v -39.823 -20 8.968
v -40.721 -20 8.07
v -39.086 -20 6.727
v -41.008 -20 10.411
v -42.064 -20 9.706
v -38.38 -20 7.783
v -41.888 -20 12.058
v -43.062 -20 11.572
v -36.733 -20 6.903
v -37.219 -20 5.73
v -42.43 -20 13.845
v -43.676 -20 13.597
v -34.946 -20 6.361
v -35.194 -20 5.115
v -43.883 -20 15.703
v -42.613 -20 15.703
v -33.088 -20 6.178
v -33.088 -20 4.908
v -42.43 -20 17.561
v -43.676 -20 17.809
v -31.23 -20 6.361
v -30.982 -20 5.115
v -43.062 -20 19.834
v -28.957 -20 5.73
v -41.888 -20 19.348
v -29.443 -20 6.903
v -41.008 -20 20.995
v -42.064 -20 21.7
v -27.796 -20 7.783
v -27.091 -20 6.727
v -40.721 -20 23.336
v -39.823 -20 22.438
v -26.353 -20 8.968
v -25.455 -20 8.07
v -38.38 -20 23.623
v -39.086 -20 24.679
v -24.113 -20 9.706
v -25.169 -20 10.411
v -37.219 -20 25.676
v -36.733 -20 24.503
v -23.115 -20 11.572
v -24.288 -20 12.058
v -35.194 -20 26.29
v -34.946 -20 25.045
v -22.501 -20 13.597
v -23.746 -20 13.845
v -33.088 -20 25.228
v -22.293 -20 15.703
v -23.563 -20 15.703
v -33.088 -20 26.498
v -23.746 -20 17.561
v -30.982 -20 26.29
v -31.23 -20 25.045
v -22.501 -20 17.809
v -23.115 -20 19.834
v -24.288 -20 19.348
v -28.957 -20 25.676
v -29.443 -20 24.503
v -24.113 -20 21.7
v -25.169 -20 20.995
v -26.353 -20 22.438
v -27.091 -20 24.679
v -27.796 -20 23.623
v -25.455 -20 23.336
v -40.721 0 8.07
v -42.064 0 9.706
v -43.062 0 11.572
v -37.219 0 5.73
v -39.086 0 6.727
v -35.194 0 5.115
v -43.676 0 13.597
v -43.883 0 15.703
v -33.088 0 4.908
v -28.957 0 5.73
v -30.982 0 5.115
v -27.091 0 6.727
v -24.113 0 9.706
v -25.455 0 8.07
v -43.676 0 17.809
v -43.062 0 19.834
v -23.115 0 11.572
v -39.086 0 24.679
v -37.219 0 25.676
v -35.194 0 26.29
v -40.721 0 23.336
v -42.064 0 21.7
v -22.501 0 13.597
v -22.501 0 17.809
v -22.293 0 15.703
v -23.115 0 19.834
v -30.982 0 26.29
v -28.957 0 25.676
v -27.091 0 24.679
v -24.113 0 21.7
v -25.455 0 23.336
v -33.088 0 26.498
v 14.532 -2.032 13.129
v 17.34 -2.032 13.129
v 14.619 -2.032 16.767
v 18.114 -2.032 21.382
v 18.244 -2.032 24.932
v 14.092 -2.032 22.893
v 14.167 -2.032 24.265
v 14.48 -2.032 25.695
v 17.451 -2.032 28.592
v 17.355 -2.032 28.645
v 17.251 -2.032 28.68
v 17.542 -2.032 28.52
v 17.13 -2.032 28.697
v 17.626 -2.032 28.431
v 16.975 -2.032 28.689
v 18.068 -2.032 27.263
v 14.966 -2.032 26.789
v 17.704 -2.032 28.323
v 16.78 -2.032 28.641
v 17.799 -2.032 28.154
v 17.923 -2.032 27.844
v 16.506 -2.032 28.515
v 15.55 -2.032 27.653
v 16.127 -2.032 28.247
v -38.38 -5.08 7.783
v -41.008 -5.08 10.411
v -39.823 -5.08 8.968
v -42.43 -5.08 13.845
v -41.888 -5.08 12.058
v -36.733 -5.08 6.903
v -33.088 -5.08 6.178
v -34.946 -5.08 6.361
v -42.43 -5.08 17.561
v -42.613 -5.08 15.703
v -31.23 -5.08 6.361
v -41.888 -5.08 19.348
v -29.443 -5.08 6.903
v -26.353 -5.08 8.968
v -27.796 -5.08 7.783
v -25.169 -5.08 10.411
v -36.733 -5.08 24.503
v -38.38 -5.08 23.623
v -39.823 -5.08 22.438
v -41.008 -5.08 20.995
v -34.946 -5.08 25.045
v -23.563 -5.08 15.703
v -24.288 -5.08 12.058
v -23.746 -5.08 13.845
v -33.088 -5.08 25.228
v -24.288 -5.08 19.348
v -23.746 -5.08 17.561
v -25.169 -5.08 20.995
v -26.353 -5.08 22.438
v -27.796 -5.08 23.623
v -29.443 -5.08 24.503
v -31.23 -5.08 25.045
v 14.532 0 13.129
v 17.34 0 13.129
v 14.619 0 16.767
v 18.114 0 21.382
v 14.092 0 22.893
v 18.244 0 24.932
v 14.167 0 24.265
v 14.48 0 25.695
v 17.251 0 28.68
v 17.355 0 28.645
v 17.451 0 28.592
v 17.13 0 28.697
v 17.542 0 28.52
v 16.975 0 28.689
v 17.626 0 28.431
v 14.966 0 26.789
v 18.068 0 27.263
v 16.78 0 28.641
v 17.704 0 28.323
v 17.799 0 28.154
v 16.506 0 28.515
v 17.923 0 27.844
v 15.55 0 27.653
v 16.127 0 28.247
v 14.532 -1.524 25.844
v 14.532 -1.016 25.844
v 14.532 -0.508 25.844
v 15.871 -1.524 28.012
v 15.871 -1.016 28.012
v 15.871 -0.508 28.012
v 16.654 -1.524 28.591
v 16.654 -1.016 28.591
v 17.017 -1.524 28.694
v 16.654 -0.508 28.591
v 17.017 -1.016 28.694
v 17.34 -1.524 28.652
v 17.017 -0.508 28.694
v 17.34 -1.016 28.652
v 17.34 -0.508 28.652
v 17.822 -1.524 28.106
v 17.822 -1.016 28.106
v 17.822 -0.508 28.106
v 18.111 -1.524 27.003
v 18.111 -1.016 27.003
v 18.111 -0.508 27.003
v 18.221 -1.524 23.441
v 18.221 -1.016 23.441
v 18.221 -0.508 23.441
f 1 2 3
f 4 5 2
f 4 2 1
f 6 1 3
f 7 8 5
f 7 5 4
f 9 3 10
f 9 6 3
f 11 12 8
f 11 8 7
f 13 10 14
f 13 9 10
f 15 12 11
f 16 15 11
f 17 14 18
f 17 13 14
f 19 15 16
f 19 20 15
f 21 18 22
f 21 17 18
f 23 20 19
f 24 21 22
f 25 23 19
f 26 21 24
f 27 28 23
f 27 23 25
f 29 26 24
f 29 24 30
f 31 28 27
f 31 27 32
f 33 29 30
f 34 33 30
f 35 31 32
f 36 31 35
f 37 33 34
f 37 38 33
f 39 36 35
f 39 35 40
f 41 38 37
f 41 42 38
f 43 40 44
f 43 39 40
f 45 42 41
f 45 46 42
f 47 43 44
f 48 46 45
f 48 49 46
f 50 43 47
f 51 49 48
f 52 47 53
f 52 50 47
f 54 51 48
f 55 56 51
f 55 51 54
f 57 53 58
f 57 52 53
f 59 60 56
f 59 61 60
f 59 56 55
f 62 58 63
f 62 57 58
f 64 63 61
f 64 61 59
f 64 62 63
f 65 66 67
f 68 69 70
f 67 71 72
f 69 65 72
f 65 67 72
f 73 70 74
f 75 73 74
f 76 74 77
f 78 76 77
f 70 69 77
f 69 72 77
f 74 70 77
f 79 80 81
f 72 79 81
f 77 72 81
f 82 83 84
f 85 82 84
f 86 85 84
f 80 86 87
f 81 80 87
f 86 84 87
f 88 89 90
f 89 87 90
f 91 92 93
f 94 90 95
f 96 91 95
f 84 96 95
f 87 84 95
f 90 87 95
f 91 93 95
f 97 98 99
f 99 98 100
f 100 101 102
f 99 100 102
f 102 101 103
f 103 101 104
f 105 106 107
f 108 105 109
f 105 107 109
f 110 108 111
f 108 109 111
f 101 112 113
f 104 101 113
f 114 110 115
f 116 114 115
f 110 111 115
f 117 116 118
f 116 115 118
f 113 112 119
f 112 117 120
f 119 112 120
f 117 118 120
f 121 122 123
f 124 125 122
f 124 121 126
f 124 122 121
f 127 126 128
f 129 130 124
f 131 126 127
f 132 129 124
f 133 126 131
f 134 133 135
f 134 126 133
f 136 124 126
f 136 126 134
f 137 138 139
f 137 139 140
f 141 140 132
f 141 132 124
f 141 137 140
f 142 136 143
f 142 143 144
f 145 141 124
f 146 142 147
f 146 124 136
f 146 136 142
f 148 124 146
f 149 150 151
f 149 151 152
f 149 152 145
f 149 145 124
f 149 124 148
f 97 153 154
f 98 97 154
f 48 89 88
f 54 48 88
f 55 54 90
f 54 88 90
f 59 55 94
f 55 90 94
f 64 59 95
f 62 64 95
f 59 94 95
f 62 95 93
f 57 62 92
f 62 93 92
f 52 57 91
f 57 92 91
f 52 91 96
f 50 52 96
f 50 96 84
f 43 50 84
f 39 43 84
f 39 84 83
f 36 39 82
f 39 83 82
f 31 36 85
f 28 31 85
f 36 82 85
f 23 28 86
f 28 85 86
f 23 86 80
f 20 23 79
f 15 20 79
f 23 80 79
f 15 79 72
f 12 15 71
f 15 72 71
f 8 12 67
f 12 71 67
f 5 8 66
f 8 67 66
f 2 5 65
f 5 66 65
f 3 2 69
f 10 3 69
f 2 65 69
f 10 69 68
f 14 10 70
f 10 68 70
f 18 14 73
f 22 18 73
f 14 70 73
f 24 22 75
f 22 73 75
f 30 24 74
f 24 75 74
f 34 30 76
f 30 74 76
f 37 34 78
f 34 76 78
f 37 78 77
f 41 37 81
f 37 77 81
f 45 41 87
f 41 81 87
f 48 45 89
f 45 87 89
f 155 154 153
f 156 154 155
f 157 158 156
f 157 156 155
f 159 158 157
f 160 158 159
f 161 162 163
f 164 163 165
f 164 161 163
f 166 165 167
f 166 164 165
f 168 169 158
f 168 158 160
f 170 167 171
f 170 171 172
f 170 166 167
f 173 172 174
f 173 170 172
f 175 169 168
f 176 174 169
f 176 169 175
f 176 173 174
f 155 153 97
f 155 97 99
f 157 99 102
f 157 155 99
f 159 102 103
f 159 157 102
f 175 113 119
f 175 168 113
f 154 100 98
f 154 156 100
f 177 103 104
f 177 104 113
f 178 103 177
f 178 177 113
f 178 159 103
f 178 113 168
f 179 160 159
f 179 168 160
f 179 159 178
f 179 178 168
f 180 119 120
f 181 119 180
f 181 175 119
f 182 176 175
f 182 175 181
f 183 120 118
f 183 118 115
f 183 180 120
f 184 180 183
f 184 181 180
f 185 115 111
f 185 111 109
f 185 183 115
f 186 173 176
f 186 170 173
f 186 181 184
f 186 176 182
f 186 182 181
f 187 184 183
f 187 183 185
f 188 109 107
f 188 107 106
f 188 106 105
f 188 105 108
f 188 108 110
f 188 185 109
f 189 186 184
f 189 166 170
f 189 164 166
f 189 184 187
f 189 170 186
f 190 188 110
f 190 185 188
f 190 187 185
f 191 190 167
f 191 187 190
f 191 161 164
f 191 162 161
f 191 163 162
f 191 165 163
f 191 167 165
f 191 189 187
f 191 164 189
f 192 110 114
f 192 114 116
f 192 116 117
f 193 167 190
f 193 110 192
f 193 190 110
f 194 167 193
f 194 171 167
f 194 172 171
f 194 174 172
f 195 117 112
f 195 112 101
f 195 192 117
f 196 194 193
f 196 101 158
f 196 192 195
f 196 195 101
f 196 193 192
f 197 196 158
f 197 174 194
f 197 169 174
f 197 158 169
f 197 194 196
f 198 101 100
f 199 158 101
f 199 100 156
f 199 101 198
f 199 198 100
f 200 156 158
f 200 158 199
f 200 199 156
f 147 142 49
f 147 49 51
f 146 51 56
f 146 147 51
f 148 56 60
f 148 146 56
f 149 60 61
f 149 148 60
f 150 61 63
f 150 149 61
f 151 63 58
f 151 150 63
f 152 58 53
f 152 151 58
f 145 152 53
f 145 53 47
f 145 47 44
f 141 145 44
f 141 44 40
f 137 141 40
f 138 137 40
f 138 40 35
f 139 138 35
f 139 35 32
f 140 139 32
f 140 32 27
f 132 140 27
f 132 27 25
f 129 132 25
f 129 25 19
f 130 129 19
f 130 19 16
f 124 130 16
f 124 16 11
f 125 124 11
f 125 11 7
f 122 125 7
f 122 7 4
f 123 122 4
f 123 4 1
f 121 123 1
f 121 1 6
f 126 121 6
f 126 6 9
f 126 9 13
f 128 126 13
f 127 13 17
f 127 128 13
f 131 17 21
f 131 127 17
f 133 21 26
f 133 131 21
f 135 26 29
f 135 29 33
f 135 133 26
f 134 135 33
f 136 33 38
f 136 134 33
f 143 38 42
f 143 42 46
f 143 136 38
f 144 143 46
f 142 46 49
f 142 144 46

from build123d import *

# Parameters (mm, degrees)
F0_R     = 10.795
F0_R_2   = 9.525
F1_DEPTH = 20
F2_DEPTH = 5.08
F4_DEPTH = 2.032


with BuildPart() as f1:
    # F0 (on Front) → F1 (new body)
    with BuildSketch(Plane.XZ):
        with Locations((-33.0882482231, 15.7028976828)):
            Circle(F0_R)
        with Locations((-33.0882482231, 15.7028976828)):
            Circle(F0_R_2, mode=Mode.SUBTRACT)
    extrude(amount=F1_DEPTH)

    # F0 (on Front) → F2 (join)
    with BuildSketch(Plane.XZ):
        with Locations((-33.0882482231, 15.7028976828)):
            Circle(F0_R_2)
    extrude(amount=F2_DEPTH)


with BuildPart() as f4:
    # F3 (on Front) → F4 (new body)
    with BuildSketch(Plane.XZ):
        with BuildLine():
            add(Edge.make_bspline(
                [(14.5322615281, 13.1285758689), (14.6216661387, 14.6532123868), (14.8229754038, 18.0861836272), (13.2038389614, 25.578497741), (19.3033824048, 31.775655622), (18.1233349997, 20.5703536662), (17.3396300524, 13.1285758689)],
                knots=[0, 0, 0, 0, 0.2033764564, 0.4579357229, 0.6399988222, 1, 1, 1, 1], degree=3))
            Line((14.5322615281, 13.1285758689), (17.3396300524, 13.1285758689))
        make_face()
    extrude(amount=F4_DEPTH)


solid = Compound([f1.part, f4.part])
